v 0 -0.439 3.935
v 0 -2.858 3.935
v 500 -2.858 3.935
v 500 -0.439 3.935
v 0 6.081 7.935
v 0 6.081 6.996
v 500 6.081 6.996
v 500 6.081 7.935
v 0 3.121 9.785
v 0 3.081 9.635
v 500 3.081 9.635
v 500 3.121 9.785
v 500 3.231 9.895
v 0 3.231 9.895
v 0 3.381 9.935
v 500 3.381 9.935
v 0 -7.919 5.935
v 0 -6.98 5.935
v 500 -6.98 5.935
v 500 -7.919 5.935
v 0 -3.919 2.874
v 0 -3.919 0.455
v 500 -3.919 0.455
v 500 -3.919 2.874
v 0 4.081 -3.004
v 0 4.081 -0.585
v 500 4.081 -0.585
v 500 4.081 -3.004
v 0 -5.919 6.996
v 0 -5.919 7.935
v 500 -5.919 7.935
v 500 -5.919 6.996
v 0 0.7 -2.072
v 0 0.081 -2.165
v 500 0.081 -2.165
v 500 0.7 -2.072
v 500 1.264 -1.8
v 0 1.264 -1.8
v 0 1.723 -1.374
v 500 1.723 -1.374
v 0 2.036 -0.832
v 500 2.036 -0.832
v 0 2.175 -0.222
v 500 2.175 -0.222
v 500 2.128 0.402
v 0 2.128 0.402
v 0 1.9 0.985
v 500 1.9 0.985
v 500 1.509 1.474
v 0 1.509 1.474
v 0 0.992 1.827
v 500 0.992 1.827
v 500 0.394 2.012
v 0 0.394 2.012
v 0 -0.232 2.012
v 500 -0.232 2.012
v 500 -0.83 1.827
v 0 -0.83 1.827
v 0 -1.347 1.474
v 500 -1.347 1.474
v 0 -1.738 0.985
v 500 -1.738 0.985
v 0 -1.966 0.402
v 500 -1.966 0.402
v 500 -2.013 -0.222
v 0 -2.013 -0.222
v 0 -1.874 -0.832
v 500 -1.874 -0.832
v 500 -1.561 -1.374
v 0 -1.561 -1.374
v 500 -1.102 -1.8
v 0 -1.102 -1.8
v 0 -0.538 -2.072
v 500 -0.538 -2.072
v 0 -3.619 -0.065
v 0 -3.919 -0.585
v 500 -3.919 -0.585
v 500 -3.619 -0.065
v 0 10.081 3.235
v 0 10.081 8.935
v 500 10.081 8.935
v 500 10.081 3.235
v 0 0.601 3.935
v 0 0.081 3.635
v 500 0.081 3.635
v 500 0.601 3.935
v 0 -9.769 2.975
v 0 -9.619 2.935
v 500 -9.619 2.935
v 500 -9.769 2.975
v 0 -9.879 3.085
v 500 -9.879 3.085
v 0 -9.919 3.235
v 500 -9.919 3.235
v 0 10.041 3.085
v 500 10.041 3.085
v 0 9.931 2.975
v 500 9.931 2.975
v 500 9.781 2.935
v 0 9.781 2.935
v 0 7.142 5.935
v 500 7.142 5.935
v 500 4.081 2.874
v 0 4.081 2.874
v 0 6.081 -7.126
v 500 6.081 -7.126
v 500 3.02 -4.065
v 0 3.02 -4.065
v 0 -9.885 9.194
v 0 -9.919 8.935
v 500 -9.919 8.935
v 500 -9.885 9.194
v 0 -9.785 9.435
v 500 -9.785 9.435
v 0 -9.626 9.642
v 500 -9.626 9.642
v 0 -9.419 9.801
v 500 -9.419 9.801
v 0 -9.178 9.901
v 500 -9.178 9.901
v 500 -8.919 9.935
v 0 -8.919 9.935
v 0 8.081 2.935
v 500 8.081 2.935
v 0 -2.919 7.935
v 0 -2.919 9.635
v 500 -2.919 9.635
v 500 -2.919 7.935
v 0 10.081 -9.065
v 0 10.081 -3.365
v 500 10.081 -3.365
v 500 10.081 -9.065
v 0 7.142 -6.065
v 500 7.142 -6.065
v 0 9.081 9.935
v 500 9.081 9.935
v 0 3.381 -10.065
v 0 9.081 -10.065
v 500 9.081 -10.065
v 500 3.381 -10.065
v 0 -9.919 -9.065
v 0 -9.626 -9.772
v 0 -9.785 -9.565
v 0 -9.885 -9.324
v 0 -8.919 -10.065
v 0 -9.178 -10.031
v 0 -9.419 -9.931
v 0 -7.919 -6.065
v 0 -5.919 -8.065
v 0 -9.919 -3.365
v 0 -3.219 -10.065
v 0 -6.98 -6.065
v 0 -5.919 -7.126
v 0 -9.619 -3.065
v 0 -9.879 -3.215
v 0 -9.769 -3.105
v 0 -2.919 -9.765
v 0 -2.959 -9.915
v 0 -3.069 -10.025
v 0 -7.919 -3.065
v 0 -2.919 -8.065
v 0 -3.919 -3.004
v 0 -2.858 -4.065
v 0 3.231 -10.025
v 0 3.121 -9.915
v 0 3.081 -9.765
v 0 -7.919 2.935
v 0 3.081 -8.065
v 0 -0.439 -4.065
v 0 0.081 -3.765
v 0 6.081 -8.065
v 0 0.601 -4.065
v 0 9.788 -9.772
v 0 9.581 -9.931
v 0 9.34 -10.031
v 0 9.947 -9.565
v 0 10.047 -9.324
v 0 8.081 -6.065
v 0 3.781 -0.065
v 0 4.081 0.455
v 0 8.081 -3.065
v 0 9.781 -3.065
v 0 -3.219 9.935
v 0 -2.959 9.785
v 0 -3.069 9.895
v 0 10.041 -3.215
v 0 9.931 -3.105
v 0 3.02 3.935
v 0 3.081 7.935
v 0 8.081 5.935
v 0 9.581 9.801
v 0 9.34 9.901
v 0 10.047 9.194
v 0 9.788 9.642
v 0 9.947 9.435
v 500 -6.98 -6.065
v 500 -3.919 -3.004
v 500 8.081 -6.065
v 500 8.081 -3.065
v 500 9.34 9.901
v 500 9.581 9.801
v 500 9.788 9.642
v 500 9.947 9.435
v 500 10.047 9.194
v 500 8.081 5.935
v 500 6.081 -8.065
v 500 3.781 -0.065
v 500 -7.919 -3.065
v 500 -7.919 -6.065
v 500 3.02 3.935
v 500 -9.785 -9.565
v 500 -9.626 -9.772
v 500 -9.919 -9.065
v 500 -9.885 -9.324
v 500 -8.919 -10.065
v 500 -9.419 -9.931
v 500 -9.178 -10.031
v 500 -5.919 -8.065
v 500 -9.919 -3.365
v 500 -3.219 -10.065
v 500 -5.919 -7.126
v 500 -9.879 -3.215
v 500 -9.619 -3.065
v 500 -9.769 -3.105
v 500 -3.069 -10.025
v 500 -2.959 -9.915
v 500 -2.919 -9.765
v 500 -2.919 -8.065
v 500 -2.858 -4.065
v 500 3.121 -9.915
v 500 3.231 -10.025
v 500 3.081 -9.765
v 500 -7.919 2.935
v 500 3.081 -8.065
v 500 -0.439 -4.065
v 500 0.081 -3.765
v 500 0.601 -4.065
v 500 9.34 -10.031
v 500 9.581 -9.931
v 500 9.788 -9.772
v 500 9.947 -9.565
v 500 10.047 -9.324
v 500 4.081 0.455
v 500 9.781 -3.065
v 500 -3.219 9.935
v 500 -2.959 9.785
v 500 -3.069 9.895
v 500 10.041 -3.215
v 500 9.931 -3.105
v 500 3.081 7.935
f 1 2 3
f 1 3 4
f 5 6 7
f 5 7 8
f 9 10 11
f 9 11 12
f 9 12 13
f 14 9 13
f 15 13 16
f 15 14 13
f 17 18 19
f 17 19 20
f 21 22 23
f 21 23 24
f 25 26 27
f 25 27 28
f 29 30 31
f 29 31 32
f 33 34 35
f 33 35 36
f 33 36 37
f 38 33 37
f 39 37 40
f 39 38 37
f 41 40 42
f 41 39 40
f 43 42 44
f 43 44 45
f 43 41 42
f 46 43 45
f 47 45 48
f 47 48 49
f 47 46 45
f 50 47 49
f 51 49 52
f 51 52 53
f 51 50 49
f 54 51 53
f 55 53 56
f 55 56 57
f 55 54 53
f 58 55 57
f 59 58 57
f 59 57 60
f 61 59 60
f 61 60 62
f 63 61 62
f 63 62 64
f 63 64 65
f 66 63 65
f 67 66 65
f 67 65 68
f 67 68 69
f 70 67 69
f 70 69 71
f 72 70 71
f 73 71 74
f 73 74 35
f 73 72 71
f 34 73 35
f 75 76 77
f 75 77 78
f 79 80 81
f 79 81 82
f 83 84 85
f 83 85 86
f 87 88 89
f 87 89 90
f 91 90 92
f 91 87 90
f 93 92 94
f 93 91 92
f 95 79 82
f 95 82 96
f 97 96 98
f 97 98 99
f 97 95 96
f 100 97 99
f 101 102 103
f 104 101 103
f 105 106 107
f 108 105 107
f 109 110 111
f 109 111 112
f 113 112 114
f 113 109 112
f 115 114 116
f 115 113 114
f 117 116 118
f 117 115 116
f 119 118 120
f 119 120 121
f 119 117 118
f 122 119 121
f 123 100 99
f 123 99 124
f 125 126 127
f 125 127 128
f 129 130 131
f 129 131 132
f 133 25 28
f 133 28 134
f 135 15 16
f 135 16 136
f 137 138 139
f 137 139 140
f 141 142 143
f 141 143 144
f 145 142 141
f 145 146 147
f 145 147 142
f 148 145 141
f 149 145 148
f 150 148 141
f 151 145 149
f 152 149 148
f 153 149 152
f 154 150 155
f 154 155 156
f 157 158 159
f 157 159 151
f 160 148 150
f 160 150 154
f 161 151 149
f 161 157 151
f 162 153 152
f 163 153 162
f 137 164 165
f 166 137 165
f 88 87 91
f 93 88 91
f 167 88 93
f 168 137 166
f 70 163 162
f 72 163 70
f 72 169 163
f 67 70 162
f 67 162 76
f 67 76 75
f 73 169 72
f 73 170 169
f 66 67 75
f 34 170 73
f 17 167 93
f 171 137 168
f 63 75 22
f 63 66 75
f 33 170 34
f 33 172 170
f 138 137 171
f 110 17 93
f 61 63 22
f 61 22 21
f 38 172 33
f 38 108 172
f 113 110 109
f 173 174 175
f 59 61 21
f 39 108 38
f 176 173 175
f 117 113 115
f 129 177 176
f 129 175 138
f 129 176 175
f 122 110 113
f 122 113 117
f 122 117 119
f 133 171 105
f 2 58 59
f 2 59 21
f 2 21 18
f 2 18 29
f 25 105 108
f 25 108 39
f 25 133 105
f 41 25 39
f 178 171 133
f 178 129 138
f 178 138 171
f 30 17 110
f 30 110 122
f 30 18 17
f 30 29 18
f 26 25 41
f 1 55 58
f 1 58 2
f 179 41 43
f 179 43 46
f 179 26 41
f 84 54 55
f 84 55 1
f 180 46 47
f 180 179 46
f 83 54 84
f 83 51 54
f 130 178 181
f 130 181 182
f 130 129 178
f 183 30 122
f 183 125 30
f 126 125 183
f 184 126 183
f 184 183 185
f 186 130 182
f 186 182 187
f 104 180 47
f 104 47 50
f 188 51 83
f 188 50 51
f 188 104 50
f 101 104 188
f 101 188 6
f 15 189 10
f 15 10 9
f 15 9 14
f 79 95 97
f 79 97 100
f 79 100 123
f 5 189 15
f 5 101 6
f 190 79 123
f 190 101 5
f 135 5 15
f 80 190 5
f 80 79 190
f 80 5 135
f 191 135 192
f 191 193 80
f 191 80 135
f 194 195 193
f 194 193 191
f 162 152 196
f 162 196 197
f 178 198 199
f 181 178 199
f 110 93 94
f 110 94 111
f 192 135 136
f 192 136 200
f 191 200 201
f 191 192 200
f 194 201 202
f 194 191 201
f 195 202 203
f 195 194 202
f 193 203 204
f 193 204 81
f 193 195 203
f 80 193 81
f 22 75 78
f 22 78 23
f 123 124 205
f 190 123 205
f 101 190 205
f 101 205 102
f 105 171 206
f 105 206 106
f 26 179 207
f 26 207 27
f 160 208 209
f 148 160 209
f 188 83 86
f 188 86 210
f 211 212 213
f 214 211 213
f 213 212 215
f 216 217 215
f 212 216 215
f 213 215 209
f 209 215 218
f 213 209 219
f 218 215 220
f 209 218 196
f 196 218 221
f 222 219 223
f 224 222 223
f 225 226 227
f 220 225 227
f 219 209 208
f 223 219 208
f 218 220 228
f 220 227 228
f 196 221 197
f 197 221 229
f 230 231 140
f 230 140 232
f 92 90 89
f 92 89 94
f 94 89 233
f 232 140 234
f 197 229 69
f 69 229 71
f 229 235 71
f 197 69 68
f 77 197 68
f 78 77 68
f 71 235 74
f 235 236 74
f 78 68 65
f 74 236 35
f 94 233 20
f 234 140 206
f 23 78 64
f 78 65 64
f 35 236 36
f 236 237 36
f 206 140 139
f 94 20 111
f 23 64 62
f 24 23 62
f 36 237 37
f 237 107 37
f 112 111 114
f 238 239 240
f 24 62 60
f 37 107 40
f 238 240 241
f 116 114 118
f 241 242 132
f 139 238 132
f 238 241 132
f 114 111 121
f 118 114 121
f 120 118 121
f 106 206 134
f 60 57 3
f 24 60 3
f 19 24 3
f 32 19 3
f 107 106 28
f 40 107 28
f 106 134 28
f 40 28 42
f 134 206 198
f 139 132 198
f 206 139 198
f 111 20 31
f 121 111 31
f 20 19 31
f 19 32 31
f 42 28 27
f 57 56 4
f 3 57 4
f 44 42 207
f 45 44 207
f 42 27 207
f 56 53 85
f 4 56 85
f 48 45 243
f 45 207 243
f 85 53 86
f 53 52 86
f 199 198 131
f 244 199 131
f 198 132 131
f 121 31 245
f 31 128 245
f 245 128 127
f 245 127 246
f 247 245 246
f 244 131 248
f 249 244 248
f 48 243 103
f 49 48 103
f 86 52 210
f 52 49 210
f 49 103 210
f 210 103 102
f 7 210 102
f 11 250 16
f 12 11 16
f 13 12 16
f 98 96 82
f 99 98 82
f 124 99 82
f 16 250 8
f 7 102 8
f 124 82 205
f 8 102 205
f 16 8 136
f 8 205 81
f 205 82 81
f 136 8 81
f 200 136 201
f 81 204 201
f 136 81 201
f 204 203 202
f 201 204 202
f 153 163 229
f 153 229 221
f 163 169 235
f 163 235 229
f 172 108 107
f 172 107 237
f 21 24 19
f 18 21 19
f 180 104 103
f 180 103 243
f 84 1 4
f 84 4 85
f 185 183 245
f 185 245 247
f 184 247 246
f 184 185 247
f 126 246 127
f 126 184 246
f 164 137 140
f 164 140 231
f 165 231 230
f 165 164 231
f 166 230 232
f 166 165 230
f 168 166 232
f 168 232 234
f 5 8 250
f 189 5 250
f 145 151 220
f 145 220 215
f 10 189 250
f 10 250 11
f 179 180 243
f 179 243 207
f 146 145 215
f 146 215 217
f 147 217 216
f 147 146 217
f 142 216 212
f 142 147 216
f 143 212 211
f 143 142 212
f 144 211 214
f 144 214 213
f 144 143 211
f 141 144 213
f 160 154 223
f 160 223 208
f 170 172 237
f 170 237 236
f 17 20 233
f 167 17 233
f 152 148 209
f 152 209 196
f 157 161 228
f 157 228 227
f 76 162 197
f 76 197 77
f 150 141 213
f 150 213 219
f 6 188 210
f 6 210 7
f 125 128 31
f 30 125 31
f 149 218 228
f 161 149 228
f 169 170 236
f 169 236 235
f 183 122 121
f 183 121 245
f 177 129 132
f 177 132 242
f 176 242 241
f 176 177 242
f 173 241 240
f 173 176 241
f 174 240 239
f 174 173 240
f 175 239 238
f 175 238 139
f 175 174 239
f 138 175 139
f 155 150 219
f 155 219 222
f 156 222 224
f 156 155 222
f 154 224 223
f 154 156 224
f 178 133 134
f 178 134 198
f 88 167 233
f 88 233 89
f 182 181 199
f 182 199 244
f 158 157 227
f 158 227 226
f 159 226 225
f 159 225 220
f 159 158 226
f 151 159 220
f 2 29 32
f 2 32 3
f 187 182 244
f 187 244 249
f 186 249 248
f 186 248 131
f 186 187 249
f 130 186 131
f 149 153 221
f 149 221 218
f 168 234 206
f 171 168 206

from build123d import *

# Parameters (mm, degrees)
SKETCH1_R           = 2.1
BOSS_EXTRUDE1_DEPTH = 500


with BuildPart() as part:
    # Sketch1 → Boss-Extrude1 (new body)
    with BuildSketch(Plane(origin=(0, 0, 0), x_dir=(0, 0, -1), z_dir=(1, 0, 0))):
        with BuildLine():
            Line((-9.935097613, 3.380939919), (-9.935097613, 9.080939919))
            ThreePointArc((-9.935097613, 9.080939919), (-9.642204394, 9.788046701), (-8.935097613, 10.080939919))
            Line((-8.935097613, 10.080939919), (-3.235097613, 10.080939919))
            ThreePointArc((-3.235097613, 10.080939919), (-3.022965579, 9.993071954), (-2.935097613, 9.780939919))
            Line((-2.935097613, 9.780939919), (-2.935097613, 8.080900091))
            Line((-2.935097613, 8.080900091), (-5.935097613, 8.080900091))
            Line((-5.935097613, 8.080900091), (-5.935097613, 7.141600091))
            Line((-5.935097613, 7.141600091), (-2.874424271, 4.080926749))
            Line((-2.874424271, 4.080926749), (-0.454699685, 4.080926749))
            Line((-0.454699685, 4.080926749), (0.064915557, 3.780926749))
            Line((0.064915557, 3.780926749), (0.5845308, 4.080926749))
            Line((0.5845308, 4.080926749), (3.004255385, 4.080926749))
            Line((3.004255385, 4.080926749), (6.064928728, 7.141600091))
            Line((6.064928728, 7.141600091), (6.064928728, 8.080900091))
            Line((6.064928728, 8.080900091), (3.064928728, 8.080900091))
            Line((3.064928728, 8.080900091), (3.064928728, 9.780939919))
            ThreePointArc((3.064928728, 9.780939919), (3.152796693, 9.993071954), (3.364928728, 10.080939919))
            Line((3.364928728, 10.080939919), (9.064928728, 10.080939919))
            ThreePointArc((9.064928728, 10.080939919), (9.772035509, 9.788046701), (10.064928728, 9.080939919))
            Line((10.064928728, 9.080939919), (10.064928728, 3.380939919))
            ThreePointArc((10.064928728, 3.380939919), (9.977060762, 3.168807885), (9.764928728, 3.080939919))
            Line((9.764928728, 3.080939919), (8.064888899, 3.080939919))
            Line((8.064888899, 3.080939919), (8.064888899, 6.080939919))
            Line((8.064888899, 6.080939919), (7.125588899, 6.080939919))
            Line((7.125588899, 6.080939919), (4.064915557, 3.020266577))
            Line((4.064915557, 3.020266577), (4.064915557, 0.600541991))
            Line((4.064915557, 0.600541991), (3.764915557, 0.080926749))
            Line((3.764915557, 0.080926749), (4.064915557, -0.438688493))
            Line((4.064915557, -0.438688493), (4.064915557, -2.858413079))
            Line((4.064915557, -2.858413079), (7.125588899, -5.919086421))
            Line((7.125588899, -5.919086421), (8.064888899, -5.919086421))
            Line((8.064888899, -5.919086421), (8.064888899, -2.919086421))
            Line((8.064888899, -2.919086421), (9.764928728, -2.919086421))
            ThreePointArc((9.764928728, -2.919086421), (9.977060762, -3.006954387), (10.064928728, -3.219086421))
            Line((10.064928728, -3.219086421), (10.064928728, -8.919086421))
            ThreePointArc((10.064928728, -8.919086421), (9.772035509, -9.626193203), (9.064928728, -9.919086421))
            Line((9.064928728, -9.919086421), (3.364928728, -9.919086421))
            ThreePointArc((3.364928728, -9.919086421), (3.152796693, -9.831218456), (3.064928728, -9.619086421))
            Line((3.064928728, -9.619086421), (3.064928728, -7.919046593))
            Line((3.064928728, -7.919046593), (6.064928728, -7.919046593))
            Line((6.064928728, -7.919046593), (6.064928728, -6.979746593))
            Line((6.064928728, -6.979746593), (3.004255385, -3.919073251))
            Line((3.004255385, -3.919073251), (0.5845308, -3.919073251))
            Line((0.5845308, -3.919073251), (0.064915557, -3.619073251))
            Line((0.064915557, -3.619073251), (-0.454699685, -3.919073251))
            Line((-0.454699685, -3.919073251), (-2.874424271, -3.919073251))
            Line((-2.874424271, -3.919073251), (-5.935097613, -6.979746593))
            Line((-5.935097613, -6.979746593), (-5.935097613, -7.919046593))
            Line((-5.935097613, -7.919046593), (-2.935097613, -7.919046593))
            Line((-2.935097613, -7.919046593), (-2.935097613, -9.619086421))
            ThreePointArc((-2.935097613, -9.619086421), (-3.022965579, -9.831218456), (-3.235097613, -9.919086421))
            Line((-3.235097613, -9.919086421), (-8.935097613, -9.919086421))
            ThreePointArc((-8.935097613, -9.919086421), (-9.642204394, -9.626193203), (-9.935097613, -8.919086421))
            Line((-9.935097613, -8.919086421), (-9.935097613, -3.219086421))
            ThreePointArc((-9.935097613, -3.219086421), (-9.847229647, -3.006954387), (-9.635097613, -2.919086421))
            Line((-9.635097613, -2.919086421), (-7.935057785, -2.919086421))
            Line((-7.935057785, -2.919086421), (-7.935057785, -5.919086421))
            Line((-7.935057785, -5.919086421), (-6.995757785, -5.919086421))
            Line((-6.995757785, -5.919086421), (-3.935084443, -2.858413079))
            Line((-3.935084443, -2.858413079), (-3.935084443, -0.438688493))
            Line((-3.935084443, -0.438688493), (-3.635084443, 0.080926749))
            Line((-3.635084443, 0.080926749), (-3.935084443, 0.600541991))
            Line((-3.935084443, 0.600541991), (-3.935084443, 3.020266577))
            Line((-3.935084443, 3.020266577), (-6.995757785, 6.080939919))
            Line((-6.995757785, 6.080939919), (-7.935057785, 6.080939919))
            Line((-7.935057785, 6.080939919), (-7.935057785, 3.080939919))
            Line((-7.935057785, 3.080939919), (-9.635097613, 3.080939919))
            ThreePointArc((-9.635097613, 3.080939919), (-9.847229647, 3.168807885), (-9.935097613, 3.380939919))
        make_face()
        with Locations((0.064915557, 0.080926749)):
            Circle(SKETCH1_R, mode=Mode.SUBTRACT)
    extrude(amount=BOSS_EXTRUDE1_DEPTH)


solid = part.part
